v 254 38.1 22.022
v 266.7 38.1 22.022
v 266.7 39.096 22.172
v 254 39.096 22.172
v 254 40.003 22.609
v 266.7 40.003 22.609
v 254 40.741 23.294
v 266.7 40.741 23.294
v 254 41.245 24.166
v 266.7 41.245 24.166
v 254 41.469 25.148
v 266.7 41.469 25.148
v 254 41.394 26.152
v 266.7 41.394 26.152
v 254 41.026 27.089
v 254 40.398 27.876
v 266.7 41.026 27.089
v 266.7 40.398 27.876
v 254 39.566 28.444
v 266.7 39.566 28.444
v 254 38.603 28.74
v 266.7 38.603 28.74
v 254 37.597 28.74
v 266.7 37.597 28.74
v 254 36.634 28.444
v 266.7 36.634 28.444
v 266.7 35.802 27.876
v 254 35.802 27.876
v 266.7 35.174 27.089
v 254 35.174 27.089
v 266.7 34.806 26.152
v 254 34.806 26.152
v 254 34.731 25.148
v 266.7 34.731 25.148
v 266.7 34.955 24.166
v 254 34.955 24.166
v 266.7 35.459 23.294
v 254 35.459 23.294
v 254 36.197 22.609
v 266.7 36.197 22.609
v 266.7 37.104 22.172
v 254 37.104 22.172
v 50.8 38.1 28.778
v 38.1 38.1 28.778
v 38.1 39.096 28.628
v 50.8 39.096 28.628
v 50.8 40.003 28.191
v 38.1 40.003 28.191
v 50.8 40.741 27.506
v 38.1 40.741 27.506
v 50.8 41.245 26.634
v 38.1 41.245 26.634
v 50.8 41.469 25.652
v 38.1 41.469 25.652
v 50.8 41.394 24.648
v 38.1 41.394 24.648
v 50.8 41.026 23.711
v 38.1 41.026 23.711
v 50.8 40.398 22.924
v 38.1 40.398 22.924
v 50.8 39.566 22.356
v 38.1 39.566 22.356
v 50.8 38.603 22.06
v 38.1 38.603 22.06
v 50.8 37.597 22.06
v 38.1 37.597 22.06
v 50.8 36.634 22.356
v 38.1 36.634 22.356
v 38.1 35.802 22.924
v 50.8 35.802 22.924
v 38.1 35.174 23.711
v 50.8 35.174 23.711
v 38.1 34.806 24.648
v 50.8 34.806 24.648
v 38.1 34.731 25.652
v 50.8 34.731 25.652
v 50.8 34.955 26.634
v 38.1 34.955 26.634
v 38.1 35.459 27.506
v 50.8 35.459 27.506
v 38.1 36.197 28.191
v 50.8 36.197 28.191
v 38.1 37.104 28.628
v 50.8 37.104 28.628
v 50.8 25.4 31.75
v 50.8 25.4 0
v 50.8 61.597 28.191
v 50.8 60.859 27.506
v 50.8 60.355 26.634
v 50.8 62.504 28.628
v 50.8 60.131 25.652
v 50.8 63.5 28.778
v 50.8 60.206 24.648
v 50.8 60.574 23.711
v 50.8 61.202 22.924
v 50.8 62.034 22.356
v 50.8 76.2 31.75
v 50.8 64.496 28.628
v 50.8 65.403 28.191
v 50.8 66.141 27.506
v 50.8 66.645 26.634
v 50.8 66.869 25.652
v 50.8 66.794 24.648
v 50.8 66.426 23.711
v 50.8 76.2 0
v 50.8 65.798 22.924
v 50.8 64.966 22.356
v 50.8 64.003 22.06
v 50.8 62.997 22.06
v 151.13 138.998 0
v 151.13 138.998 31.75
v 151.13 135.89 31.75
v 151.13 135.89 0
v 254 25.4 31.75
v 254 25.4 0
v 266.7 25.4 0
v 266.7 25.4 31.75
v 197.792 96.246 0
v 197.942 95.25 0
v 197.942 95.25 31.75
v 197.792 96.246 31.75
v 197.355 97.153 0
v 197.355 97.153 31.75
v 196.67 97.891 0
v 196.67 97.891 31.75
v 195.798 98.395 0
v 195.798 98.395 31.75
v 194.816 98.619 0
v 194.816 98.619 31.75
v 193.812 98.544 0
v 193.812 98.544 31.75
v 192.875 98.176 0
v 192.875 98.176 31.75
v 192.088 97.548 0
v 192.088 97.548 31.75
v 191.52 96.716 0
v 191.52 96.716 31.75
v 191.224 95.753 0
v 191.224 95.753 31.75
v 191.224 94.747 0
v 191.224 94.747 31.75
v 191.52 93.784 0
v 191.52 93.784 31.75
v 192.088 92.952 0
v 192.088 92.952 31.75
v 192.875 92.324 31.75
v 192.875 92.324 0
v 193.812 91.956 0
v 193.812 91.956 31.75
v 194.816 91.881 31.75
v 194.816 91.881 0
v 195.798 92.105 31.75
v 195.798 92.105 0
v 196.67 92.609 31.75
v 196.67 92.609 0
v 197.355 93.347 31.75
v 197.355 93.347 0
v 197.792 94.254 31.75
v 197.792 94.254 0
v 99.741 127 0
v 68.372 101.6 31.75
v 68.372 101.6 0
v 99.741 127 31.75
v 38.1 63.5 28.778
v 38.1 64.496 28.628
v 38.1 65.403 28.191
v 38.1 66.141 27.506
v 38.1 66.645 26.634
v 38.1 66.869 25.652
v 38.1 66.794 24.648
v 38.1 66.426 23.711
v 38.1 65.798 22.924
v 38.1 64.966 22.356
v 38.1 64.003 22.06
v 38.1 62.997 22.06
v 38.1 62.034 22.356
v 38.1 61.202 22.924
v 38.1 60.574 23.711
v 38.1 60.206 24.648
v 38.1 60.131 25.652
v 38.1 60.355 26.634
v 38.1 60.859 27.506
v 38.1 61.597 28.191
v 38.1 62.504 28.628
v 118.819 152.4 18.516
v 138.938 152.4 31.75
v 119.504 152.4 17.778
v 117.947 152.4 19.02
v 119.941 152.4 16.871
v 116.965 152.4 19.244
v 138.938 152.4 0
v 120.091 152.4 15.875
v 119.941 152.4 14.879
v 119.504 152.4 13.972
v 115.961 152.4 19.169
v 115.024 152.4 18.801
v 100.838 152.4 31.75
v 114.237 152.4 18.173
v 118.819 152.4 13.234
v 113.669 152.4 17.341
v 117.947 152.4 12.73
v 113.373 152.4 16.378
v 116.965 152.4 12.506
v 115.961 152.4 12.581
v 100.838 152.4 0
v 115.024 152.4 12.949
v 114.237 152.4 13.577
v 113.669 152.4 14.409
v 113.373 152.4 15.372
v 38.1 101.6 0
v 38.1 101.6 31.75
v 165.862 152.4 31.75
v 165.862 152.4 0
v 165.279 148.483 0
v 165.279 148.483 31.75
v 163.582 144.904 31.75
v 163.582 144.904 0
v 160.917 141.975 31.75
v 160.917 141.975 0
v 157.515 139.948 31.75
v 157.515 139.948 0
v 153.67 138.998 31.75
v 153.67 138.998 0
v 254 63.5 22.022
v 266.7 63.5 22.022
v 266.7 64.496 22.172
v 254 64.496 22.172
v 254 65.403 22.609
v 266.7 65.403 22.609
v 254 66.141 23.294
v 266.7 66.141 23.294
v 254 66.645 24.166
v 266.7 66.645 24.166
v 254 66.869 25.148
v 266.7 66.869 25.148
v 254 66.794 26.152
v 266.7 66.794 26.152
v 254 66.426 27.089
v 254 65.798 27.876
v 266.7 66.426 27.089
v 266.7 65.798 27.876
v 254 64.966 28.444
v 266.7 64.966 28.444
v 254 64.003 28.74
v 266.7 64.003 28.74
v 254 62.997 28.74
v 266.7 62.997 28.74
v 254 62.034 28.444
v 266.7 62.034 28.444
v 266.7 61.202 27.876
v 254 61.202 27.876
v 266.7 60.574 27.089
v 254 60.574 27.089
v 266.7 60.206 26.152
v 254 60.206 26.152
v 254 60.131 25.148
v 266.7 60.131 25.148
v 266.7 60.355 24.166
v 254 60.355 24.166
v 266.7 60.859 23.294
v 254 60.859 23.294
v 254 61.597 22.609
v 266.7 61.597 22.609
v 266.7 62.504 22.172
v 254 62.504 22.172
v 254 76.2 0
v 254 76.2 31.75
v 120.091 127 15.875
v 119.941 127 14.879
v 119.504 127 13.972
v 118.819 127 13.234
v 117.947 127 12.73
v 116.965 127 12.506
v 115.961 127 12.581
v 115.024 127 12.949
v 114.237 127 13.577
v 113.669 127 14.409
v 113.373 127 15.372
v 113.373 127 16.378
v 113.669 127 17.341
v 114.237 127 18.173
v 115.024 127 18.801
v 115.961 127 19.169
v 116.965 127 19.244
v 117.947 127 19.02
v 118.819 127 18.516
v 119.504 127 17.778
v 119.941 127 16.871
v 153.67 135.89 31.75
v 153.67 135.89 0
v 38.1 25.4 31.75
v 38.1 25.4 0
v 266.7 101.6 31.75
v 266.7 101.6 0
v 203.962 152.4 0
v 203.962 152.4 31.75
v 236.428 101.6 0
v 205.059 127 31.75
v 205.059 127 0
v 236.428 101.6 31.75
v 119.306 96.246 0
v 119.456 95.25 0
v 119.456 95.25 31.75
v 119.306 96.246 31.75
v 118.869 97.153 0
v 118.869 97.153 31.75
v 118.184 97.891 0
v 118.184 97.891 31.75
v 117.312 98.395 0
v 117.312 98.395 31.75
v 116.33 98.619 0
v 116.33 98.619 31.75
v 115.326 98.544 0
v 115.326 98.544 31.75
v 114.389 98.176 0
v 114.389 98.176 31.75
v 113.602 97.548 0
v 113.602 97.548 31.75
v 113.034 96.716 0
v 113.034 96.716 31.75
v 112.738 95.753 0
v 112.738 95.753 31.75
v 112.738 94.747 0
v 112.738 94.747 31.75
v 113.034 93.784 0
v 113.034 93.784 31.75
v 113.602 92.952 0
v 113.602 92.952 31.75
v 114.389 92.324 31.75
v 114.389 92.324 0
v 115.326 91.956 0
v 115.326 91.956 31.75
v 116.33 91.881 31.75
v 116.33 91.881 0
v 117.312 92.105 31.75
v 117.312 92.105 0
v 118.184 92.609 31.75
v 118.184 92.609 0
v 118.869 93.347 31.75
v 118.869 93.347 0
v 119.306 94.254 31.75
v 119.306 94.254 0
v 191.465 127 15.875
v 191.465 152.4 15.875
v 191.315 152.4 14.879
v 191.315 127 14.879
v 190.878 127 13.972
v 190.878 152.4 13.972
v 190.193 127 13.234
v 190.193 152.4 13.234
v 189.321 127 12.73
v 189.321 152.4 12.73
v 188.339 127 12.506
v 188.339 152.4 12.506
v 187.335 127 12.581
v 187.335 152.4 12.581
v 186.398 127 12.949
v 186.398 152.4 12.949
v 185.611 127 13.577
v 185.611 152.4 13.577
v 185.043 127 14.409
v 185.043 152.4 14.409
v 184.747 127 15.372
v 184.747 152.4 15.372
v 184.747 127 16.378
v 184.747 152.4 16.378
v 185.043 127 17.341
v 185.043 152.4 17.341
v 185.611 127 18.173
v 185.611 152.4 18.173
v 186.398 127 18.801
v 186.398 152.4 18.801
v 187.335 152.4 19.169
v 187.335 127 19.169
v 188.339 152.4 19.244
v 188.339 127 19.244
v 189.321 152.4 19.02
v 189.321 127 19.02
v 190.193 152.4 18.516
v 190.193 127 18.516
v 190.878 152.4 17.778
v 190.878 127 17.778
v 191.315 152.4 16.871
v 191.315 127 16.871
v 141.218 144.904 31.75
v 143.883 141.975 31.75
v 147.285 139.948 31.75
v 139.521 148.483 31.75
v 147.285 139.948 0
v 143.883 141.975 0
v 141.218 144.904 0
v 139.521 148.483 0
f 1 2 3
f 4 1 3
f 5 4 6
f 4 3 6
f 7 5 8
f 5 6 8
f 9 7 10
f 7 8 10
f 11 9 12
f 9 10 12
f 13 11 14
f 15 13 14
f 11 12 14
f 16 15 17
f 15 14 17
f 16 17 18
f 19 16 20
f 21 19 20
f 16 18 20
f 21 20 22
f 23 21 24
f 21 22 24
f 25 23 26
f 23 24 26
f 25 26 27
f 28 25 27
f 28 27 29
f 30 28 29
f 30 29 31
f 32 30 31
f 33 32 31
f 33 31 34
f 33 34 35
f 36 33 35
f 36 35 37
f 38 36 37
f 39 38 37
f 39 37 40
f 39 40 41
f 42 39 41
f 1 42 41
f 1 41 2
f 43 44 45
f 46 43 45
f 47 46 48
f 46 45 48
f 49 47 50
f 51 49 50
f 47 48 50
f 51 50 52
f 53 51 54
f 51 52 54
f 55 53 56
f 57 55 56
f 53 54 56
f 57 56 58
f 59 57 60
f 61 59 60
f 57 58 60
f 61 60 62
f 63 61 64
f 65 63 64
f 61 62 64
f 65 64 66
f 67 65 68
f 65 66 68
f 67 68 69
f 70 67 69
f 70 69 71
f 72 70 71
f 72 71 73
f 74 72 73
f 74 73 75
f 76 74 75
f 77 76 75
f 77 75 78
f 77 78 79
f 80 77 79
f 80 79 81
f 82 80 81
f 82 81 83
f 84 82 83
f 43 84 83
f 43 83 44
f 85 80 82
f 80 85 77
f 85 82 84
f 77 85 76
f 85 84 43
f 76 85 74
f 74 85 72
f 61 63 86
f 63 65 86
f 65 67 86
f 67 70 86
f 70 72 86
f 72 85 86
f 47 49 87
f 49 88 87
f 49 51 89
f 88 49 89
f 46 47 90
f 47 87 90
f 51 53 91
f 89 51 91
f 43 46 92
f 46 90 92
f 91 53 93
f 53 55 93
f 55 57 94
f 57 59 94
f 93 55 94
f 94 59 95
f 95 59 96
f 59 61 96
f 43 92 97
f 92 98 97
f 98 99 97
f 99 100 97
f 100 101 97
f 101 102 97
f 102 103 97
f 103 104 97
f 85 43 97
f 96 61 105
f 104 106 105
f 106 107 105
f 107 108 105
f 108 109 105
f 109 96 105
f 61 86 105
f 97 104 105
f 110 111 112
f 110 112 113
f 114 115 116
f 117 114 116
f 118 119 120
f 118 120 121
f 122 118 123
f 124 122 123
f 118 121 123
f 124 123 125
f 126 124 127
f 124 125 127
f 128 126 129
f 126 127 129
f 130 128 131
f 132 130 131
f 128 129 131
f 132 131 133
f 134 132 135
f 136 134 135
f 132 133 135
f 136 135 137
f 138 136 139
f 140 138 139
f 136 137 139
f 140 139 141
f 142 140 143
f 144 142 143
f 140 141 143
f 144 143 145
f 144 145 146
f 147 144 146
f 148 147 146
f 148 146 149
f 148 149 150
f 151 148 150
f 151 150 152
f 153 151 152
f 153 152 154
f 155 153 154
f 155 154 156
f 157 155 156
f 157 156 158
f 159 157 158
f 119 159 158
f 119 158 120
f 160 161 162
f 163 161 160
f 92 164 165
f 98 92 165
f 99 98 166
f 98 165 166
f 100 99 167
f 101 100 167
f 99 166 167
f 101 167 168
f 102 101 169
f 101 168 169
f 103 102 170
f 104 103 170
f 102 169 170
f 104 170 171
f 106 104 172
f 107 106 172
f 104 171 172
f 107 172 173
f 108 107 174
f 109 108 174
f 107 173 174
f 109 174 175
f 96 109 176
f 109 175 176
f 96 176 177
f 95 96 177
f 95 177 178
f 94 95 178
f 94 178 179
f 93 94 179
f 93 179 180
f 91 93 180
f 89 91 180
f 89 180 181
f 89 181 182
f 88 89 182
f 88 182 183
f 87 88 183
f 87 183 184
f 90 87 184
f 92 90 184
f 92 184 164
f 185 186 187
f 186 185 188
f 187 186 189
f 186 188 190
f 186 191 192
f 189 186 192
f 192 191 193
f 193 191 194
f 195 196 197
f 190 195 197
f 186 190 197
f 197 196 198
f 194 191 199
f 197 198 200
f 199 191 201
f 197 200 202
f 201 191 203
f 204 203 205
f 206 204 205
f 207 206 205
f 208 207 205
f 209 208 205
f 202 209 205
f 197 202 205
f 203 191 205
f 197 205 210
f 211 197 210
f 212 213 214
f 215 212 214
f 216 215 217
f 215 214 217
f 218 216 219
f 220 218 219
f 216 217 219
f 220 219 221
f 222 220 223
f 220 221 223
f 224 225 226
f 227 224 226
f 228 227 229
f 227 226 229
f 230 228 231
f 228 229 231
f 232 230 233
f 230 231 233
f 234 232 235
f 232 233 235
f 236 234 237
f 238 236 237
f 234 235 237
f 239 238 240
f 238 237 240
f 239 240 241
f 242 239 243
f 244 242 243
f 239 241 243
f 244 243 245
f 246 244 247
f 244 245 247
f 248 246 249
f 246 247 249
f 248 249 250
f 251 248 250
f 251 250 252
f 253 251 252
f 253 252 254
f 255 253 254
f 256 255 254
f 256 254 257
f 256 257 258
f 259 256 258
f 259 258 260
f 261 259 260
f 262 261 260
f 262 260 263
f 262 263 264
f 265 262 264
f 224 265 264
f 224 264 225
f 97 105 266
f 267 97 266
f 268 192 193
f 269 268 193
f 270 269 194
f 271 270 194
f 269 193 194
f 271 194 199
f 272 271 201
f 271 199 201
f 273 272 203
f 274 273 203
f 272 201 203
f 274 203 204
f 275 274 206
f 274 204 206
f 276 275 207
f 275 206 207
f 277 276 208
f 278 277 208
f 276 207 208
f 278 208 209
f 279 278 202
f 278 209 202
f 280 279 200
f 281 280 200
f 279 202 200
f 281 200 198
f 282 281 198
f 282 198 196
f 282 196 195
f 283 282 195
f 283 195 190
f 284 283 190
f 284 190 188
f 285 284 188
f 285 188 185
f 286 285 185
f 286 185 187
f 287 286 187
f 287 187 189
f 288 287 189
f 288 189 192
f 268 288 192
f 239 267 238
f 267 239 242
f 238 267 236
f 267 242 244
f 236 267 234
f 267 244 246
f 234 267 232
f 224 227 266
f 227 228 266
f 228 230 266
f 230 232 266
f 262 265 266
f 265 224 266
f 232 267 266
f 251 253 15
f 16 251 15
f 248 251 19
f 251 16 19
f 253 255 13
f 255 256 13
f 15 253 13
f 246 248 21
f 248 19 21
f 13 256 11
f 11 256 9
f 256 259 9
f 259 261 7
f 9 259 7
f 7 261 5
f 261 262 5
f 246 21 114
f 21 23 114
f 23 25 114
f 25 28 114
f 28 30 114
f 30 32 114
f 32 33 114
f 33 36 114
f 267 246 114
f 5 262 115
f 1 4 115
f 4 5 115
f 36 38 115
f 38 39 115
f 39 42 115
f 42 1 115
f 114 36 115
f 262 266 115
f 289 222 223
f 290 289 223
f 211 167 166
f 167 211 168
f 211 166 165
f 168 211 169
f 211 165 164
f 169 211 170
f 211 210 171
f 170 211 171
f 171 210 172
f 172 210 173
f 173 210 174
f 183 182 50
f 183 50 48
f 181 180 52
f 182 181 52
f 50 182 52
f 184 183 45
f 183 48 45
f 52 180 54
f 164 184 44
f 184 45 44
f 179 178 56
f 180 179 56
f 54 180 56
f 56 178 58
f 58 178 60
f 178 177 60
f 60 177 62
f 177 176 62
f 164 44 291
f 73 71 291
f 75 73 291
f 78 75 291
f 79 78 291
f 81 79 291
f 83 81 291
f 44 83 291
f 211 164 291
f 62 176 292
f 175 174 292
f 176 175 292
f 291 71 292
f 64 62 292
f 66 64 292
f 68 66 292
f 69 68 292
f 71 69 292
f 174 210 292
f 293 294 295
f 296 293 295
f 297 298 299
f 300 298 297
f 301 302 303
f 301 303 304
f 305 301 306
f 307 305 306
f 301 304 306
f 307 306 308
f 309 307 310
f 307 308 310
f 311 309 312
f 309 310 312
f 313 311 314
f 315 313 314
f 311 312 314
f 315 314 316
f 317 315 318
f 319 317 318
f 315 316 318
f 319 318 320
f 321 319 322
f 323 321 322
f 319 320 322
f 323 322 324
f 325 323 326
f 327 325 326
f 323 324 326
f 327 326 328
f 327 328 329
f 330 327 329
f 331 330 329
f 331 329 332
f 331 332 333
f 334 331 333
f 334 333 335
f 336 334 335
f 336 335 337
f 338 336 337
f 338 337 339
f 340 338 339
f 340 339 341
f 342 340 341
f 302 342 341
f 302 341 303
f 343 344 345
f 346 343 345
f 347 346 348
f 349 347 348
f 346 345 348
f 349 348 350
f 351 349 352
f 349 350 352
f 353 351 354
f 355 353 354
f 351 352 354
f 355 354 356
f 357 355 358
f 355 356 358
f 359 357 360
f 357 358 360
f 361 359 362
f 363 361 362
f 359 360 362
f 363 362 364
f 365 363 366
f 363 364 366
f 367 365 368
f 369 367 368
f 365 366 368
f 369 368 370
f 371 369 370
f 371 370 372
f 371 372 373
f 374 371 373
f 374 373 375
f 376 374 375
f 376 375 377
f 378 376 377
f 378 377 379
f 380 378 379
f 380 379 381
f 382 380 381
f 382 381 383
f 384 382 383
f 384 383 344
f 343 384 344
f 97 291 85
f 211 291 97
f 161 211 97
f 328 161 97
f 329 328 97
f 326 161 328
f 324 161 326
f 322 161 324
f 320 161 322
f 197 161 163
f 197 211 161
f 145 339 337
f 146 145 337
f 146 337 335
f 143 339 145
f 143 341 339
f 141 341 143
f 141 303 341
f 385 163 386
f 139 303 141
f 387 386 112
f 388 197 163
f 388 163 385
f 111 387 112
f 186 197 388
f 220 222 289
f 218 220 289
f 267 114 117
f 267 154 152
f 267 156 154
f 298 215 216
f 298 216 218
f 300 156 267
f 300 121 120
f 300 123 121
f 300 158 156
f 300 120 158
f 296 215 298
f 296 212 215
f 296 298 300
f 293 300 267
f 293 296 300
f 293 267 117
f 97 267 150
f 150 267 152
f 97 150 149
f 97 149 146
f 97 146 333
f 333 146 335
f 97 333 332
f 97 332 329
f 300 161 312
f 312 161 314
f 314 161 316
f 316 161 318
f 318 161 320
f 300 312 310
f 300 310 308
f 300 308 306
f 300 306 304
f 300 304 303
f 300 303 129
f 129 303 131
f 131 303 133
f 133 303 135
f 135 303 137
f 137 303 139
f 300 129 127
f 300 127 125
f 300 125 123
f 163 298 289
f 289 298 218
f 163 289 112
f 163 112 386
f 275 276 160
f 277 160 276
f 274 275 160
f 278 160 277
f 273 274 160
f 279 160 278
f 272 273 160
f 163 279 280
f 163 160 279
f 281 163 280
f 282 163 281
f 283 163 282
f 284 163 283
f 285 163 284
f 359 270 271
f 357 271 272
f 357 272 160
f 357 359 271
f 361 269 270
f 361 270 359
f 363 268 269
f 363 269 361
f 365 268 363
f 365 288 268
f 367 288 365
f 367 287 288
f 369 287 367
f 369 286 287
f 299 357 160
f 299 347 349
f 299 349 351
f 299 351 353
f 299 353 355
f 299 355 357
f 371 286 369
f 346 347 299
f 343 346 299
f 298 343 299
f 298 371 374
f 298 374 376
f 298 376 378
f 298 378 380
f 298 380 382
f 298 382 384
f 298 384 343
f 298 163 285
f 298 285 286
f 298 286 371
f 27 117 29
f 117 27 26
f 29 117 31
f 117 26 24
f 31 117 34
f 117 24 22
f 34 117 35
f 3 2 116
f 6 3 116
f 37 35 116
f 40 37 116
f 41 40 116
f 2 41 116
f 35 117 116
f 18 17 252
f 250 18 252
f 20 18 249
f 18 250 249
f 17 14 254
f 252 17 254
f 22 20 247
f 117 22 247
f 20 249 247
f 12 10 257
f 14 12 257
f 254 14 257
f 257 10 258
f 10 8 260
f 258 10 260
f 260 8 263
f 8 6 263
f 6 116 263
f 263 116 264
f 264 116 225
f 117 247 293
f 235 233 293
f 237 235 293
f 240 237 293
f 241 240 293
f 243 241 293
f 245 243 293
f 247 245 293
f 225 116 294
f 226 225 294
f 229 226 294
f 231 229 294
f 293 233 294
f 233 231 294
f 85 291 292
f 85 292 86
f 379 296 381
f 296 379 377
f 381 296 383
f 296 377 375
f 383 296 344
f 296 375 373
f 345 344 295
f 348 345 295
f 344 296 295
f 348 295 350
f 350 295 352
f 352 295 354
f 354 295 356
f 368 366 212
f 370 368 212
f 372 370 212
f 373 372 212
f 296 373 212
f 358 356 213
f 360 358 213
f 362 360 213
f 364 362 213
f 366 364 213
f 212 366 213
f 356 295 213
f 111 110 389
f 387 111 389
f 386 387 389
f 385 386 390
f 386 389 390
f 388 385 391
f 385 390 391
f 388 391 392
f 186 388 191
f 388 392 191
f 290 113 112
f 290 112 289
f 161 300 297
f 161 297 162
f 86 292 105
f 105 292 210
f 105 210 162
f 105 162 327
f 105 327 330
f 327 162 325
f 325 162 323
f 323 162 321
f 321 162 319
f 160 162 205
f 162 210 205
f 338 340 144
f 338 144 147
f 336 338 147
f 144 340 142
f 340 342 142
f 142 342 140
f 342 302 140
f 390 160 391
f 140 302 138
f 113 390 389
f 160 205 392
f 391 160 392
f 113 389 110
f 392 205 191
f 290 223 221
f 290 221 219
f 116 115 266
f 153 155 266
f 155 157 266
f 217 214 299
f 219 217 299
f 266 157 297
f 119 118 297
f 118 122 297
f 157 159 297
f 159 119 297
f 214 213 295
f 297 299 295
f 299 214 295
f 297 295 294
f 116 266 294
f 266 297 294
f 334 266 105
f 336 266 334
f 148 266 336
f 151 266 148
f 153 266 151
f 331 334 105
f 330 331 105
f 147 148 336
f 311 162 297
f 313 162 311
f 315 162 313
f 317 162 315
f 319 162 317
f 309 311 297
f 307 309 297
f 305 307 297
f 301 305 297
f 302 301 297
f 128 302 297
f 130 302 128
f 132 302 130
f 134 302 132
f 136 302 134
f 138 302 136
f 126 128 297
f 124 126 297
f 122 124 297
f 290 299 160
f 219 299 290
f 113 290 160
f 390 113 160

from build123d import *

# Parameters (mm, degrees)
BOSS_EXTRUDE1_DEPTH = 50.8
SKETCH3_R           = 3.3782
CUT_EXTRUDE1_DEPTH  = 25.4
SKETCH4_R           = 3.3782
CUT_EXTRUDE2_DEPTH  = 25.4
SKETCH7_W           = 279.740966103
SKETCH7_H           = 194.949015238
CUT_EXTRUDE5_DEPTH  = 19.05
SKETCH8_W           = 228.6
SKETCH8_H           = 25.4
CUT_EXTRUDE6_DEPTH  = 39.37
SKETCH9_R           = 3.3782
CUT_EXTRUDE7_DEPTH  = 27.94
CUT_EXTRUDE8_DEPTH  = 40.64
SKETCH12_W          = 1.27
SKETCH12_H          = 31.75
CUT_EXTRUDE9_DEPTH  = 16.51
CUT_EXTRUDE10_REACH = 33.75
SKETCH13_R          = 3.3782


with BuildPart() as part:
    # Sketch2 → Boss-Extrude1 (new body)
    with BuildSketch(Plane.XY):
        with BuildLine():
            Line((254, 0), (266.7, 0))
            Line((266.7, 0), (266.7, 101.6))
            Line((266.7, 101.6), (203.962, 152.4))
            Line((203.962, 152.4), (165.862, 152.4))
            ThreePointArc((165.862, 152.4), (152.4, 138.938), (138.938, 152.4))
            Line((138.938, 152.4), (100.838, 152.4))
            Line((100.838, 152.4), (38.1, 101.6))
            Line((38.1, 101.6), (38.1, 0))
            Line((38.1, 0), (50.8, 0))
            Line((50.8, 0), (50.8, 76.2))
            Line((50.8, 76.2), (254, 76.2))
            Line((254, 76.2), (254, 0))
        make_face()
    extrude(amount=BOSS_EXTRUDE1_DEPTH)

    # Sketch3 → Cut-Extrude1 (cut)
    with BuildSketch(Plane.ZY.offset(-38.1)):
        with Locations((25.4, 63.5)):
            Circle(SKETCH3_R)
        with Locations((25.4, 38.1)):
            Circle(SKETCH3_R)
    extrude(amount=-CUT_EXTRUDE1_DEPTH, mode=Mode.SUBTRACT)

    # Sketch4 → Cut-Extrude2 (cut)
    with BuildSketch(Plane(origin=(266.7, 0, 0), x_dir=(0, 0, -1), z_dir=(1, 0, 0))):
        with Locations((-25.4, 63.5)):
            Circle(SKETCH4_R)
        with Locations((-25.4, 38.1)):
            Circle(SKETCH4_R)
    extrude(amount=-CUT_EXTRUDE2_DEPTH, mode=Mode.SUBTRACT)

    # Sketch7 → Cut-Extrude5 (cut)
    with BuildSketch(Plane.XY.offset(50.8)):
        with Locations((152.037641236, 76.2)):
            Rectangle(SKETCH7_W, SKETCH7_H)
    extrude(amount=-CUT_EXTRUDE5_DEPTH, mode=Mode.SUBTRACT)

    # Sketch8 → Cut-Extrude6 (cut)
    with BuildSketch(Plane.XY.offset(31.75)):
        with Locations((152.4, 12.7)):
            Rectangle(SKETCH8_W, SKETCH8_H)
    extrude(amount=-CUT_EXTRUDE6_DEPTH, mode=Mode.SUBTRACT)

    # Sketch9 → Cut-Extrude7 (cut)
    with BuildSketch(Plane(origin=(0, 152.4, 0), x_dir=(1, 0, 0), z_dir=(0, 1, 0))):
        with Locations((116.713, -15.875)):
            Circle(SKETCH9_R)
        with Locations((188.087, -15.875)):
            Circle(SKETCH9_R)
    extrude(amount=-CUT_EXTRUDE7_DEPTH, mode=Mode.SUBTRACT)

    # Sketch10 → Cut-Extrude8 (cut)
    with BuildSketch(Plane.XY.offset(31.75)):
        Polygon((68.372272223, 101.6), (99.741272223, 127), (205.058727777, 127), (236.427727777, 101.6), align=None)
    extrude(amount=-CUT_EXTRUDE8_DEPTH, mode=Mode.SUBTRACT)

    # Sketch12 → Cut-Extrude9 (cut)
    with BuildSketch(Plane(origin=(0, 152.4, 0), x_dir=(1, 0, 0), z_dir=(0, 1, 0))):
        with Locations((153.035, -15.875)):
            Rectangle(SKETCH12_W, SKETCH12_H)
        with Locations((151.765, -15.875)):
            Rectangle(SKETCH12_W, SKETCH12_H)
    extrude(amount=-CUT_EXTRUDE9_DEPTH, mode=Mode.SUBTRACT)

    # Sketch13 → Cut-Extrude10 (cut, up to next)
    with BuildSketch(Plane.XY.offset(31.75), mode=Mode.PRIVATE) as cut_extrude10_sk1:
        with Locations((116.078, 95.25)):
            Circle(SKETCH13_R)
    cut_extrude10_tool1 = extrude(cut_extrude10_sk1.sketch, amount=-CUT_EXTRUDE10_REACH, mode=Mode.PRIVATE) & part.part
    add(cut_extrude10_tool1.solids().sort_by_distance((116.078, 95.25, 31.75))[0], mode=Mode.SUBTRACT)
    # Sketch13 → Cut-Extrude10 (cut, up to next)
    with BuildSketch(Plane.XY.offset(31.75), mode=Mode.PRIVATE) as cut_extrude10_sk2:
        with Locations((194.564, 95.25)):
            Circle(SKETCH13_R)
    cut_extrude10_tool2 = extrude(cut_extrude10_sk2.sketch, amount=-CUT_EXTRUDE10_REACH, mode=Mode.PRIVATE) & part.part
    add(cut_extrude10_tool2.solids().sort_by_distance((194.564, 95.25, 31.75))[0], mode=Mode.SUBTRACT)


solid = part.part
